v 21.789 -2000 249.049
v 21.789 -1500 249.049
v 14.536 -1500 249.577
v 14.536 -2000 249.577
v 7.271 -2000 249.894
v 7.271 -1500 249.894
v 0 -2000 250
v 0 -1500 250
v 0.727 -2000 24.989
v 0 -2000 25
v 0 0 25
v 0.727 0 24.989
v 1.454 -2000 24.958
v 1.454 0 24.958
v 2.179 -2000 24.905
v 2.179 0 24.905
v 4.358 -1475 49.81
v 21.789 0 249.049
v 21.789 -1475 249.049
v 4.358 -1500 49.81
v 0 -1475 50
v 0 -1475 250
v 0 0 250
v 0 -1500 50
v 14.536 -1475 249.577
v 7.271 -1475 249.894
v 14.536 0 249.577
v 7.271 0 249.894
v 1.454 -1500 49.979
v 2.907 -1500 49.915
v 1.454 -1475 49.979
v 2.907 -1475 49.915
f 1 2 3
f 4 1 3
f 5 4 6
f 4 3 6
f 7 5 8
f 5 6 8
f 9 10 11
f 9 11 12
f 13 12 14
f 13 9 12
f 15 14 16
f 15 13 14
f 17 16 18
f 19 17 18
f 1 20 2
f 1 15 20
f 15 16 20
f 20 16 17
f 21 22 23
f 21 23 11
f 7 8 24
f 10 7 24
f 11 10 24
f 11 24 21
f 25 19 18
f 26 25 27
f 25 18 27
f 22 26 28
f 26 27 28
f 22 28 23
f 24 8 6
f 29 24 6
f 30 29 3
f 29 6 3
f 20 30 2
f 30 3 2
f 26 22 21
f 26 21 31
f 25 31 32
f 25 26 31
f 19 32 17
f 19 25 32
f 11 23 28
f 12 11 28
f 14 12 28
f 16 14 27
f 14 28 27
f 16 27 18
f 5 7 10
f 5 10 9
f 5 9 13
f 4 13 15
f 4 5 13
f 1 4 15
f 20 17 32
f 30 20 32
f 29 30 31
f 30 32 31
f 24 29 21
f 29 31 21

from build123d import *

# Parameters (mm, degrees)
F0_R     = 250
F1_DEPTH = 2000
F3_R     = 250
F3_R_2   = 50
F4_DEPTH = 25
F6_DEPTH = 2000


with BuildPart() as f1:
    # F0 (on Front) → F1 (new body)
    with BuildSketch(Plane.XZ):
        Circle(F0_R)
    extrude(amount=F1_DEPTH)

    # F3 (on offset) → F4 (cut)
    with BuildSketch(Plane.XZ.offset(1475)):
        Circle(F3_R)
        Circle(F3_R_2, mode=Mode.SUBTRACT)
    extrude(amount=F4_DEPTH, mode=Mode.SUBTRACT)

    # F5 (on face) → F6 (intersect)
    with BuildSketch(Plane.XZ.offset(2000)):
        with BuildLine():
            ThreePointArc((21.7889356869, 249.0486745229), (10.9048468413, 249.7620553955), (0, 250))
            Line((0, 250), (0, 25))
            ThreePointArc((0, 25), (1.0904846841, 24.9762055395), (2.1788935687, 24.9048674523))
            Line((2.1788935687, 24.9048674523), (21.7889356869, 249.0486745229))
        make_face()
    extrude(amount=-F6_DEPTH, mode=Mode.INTERSECT)


solid = f1.part
